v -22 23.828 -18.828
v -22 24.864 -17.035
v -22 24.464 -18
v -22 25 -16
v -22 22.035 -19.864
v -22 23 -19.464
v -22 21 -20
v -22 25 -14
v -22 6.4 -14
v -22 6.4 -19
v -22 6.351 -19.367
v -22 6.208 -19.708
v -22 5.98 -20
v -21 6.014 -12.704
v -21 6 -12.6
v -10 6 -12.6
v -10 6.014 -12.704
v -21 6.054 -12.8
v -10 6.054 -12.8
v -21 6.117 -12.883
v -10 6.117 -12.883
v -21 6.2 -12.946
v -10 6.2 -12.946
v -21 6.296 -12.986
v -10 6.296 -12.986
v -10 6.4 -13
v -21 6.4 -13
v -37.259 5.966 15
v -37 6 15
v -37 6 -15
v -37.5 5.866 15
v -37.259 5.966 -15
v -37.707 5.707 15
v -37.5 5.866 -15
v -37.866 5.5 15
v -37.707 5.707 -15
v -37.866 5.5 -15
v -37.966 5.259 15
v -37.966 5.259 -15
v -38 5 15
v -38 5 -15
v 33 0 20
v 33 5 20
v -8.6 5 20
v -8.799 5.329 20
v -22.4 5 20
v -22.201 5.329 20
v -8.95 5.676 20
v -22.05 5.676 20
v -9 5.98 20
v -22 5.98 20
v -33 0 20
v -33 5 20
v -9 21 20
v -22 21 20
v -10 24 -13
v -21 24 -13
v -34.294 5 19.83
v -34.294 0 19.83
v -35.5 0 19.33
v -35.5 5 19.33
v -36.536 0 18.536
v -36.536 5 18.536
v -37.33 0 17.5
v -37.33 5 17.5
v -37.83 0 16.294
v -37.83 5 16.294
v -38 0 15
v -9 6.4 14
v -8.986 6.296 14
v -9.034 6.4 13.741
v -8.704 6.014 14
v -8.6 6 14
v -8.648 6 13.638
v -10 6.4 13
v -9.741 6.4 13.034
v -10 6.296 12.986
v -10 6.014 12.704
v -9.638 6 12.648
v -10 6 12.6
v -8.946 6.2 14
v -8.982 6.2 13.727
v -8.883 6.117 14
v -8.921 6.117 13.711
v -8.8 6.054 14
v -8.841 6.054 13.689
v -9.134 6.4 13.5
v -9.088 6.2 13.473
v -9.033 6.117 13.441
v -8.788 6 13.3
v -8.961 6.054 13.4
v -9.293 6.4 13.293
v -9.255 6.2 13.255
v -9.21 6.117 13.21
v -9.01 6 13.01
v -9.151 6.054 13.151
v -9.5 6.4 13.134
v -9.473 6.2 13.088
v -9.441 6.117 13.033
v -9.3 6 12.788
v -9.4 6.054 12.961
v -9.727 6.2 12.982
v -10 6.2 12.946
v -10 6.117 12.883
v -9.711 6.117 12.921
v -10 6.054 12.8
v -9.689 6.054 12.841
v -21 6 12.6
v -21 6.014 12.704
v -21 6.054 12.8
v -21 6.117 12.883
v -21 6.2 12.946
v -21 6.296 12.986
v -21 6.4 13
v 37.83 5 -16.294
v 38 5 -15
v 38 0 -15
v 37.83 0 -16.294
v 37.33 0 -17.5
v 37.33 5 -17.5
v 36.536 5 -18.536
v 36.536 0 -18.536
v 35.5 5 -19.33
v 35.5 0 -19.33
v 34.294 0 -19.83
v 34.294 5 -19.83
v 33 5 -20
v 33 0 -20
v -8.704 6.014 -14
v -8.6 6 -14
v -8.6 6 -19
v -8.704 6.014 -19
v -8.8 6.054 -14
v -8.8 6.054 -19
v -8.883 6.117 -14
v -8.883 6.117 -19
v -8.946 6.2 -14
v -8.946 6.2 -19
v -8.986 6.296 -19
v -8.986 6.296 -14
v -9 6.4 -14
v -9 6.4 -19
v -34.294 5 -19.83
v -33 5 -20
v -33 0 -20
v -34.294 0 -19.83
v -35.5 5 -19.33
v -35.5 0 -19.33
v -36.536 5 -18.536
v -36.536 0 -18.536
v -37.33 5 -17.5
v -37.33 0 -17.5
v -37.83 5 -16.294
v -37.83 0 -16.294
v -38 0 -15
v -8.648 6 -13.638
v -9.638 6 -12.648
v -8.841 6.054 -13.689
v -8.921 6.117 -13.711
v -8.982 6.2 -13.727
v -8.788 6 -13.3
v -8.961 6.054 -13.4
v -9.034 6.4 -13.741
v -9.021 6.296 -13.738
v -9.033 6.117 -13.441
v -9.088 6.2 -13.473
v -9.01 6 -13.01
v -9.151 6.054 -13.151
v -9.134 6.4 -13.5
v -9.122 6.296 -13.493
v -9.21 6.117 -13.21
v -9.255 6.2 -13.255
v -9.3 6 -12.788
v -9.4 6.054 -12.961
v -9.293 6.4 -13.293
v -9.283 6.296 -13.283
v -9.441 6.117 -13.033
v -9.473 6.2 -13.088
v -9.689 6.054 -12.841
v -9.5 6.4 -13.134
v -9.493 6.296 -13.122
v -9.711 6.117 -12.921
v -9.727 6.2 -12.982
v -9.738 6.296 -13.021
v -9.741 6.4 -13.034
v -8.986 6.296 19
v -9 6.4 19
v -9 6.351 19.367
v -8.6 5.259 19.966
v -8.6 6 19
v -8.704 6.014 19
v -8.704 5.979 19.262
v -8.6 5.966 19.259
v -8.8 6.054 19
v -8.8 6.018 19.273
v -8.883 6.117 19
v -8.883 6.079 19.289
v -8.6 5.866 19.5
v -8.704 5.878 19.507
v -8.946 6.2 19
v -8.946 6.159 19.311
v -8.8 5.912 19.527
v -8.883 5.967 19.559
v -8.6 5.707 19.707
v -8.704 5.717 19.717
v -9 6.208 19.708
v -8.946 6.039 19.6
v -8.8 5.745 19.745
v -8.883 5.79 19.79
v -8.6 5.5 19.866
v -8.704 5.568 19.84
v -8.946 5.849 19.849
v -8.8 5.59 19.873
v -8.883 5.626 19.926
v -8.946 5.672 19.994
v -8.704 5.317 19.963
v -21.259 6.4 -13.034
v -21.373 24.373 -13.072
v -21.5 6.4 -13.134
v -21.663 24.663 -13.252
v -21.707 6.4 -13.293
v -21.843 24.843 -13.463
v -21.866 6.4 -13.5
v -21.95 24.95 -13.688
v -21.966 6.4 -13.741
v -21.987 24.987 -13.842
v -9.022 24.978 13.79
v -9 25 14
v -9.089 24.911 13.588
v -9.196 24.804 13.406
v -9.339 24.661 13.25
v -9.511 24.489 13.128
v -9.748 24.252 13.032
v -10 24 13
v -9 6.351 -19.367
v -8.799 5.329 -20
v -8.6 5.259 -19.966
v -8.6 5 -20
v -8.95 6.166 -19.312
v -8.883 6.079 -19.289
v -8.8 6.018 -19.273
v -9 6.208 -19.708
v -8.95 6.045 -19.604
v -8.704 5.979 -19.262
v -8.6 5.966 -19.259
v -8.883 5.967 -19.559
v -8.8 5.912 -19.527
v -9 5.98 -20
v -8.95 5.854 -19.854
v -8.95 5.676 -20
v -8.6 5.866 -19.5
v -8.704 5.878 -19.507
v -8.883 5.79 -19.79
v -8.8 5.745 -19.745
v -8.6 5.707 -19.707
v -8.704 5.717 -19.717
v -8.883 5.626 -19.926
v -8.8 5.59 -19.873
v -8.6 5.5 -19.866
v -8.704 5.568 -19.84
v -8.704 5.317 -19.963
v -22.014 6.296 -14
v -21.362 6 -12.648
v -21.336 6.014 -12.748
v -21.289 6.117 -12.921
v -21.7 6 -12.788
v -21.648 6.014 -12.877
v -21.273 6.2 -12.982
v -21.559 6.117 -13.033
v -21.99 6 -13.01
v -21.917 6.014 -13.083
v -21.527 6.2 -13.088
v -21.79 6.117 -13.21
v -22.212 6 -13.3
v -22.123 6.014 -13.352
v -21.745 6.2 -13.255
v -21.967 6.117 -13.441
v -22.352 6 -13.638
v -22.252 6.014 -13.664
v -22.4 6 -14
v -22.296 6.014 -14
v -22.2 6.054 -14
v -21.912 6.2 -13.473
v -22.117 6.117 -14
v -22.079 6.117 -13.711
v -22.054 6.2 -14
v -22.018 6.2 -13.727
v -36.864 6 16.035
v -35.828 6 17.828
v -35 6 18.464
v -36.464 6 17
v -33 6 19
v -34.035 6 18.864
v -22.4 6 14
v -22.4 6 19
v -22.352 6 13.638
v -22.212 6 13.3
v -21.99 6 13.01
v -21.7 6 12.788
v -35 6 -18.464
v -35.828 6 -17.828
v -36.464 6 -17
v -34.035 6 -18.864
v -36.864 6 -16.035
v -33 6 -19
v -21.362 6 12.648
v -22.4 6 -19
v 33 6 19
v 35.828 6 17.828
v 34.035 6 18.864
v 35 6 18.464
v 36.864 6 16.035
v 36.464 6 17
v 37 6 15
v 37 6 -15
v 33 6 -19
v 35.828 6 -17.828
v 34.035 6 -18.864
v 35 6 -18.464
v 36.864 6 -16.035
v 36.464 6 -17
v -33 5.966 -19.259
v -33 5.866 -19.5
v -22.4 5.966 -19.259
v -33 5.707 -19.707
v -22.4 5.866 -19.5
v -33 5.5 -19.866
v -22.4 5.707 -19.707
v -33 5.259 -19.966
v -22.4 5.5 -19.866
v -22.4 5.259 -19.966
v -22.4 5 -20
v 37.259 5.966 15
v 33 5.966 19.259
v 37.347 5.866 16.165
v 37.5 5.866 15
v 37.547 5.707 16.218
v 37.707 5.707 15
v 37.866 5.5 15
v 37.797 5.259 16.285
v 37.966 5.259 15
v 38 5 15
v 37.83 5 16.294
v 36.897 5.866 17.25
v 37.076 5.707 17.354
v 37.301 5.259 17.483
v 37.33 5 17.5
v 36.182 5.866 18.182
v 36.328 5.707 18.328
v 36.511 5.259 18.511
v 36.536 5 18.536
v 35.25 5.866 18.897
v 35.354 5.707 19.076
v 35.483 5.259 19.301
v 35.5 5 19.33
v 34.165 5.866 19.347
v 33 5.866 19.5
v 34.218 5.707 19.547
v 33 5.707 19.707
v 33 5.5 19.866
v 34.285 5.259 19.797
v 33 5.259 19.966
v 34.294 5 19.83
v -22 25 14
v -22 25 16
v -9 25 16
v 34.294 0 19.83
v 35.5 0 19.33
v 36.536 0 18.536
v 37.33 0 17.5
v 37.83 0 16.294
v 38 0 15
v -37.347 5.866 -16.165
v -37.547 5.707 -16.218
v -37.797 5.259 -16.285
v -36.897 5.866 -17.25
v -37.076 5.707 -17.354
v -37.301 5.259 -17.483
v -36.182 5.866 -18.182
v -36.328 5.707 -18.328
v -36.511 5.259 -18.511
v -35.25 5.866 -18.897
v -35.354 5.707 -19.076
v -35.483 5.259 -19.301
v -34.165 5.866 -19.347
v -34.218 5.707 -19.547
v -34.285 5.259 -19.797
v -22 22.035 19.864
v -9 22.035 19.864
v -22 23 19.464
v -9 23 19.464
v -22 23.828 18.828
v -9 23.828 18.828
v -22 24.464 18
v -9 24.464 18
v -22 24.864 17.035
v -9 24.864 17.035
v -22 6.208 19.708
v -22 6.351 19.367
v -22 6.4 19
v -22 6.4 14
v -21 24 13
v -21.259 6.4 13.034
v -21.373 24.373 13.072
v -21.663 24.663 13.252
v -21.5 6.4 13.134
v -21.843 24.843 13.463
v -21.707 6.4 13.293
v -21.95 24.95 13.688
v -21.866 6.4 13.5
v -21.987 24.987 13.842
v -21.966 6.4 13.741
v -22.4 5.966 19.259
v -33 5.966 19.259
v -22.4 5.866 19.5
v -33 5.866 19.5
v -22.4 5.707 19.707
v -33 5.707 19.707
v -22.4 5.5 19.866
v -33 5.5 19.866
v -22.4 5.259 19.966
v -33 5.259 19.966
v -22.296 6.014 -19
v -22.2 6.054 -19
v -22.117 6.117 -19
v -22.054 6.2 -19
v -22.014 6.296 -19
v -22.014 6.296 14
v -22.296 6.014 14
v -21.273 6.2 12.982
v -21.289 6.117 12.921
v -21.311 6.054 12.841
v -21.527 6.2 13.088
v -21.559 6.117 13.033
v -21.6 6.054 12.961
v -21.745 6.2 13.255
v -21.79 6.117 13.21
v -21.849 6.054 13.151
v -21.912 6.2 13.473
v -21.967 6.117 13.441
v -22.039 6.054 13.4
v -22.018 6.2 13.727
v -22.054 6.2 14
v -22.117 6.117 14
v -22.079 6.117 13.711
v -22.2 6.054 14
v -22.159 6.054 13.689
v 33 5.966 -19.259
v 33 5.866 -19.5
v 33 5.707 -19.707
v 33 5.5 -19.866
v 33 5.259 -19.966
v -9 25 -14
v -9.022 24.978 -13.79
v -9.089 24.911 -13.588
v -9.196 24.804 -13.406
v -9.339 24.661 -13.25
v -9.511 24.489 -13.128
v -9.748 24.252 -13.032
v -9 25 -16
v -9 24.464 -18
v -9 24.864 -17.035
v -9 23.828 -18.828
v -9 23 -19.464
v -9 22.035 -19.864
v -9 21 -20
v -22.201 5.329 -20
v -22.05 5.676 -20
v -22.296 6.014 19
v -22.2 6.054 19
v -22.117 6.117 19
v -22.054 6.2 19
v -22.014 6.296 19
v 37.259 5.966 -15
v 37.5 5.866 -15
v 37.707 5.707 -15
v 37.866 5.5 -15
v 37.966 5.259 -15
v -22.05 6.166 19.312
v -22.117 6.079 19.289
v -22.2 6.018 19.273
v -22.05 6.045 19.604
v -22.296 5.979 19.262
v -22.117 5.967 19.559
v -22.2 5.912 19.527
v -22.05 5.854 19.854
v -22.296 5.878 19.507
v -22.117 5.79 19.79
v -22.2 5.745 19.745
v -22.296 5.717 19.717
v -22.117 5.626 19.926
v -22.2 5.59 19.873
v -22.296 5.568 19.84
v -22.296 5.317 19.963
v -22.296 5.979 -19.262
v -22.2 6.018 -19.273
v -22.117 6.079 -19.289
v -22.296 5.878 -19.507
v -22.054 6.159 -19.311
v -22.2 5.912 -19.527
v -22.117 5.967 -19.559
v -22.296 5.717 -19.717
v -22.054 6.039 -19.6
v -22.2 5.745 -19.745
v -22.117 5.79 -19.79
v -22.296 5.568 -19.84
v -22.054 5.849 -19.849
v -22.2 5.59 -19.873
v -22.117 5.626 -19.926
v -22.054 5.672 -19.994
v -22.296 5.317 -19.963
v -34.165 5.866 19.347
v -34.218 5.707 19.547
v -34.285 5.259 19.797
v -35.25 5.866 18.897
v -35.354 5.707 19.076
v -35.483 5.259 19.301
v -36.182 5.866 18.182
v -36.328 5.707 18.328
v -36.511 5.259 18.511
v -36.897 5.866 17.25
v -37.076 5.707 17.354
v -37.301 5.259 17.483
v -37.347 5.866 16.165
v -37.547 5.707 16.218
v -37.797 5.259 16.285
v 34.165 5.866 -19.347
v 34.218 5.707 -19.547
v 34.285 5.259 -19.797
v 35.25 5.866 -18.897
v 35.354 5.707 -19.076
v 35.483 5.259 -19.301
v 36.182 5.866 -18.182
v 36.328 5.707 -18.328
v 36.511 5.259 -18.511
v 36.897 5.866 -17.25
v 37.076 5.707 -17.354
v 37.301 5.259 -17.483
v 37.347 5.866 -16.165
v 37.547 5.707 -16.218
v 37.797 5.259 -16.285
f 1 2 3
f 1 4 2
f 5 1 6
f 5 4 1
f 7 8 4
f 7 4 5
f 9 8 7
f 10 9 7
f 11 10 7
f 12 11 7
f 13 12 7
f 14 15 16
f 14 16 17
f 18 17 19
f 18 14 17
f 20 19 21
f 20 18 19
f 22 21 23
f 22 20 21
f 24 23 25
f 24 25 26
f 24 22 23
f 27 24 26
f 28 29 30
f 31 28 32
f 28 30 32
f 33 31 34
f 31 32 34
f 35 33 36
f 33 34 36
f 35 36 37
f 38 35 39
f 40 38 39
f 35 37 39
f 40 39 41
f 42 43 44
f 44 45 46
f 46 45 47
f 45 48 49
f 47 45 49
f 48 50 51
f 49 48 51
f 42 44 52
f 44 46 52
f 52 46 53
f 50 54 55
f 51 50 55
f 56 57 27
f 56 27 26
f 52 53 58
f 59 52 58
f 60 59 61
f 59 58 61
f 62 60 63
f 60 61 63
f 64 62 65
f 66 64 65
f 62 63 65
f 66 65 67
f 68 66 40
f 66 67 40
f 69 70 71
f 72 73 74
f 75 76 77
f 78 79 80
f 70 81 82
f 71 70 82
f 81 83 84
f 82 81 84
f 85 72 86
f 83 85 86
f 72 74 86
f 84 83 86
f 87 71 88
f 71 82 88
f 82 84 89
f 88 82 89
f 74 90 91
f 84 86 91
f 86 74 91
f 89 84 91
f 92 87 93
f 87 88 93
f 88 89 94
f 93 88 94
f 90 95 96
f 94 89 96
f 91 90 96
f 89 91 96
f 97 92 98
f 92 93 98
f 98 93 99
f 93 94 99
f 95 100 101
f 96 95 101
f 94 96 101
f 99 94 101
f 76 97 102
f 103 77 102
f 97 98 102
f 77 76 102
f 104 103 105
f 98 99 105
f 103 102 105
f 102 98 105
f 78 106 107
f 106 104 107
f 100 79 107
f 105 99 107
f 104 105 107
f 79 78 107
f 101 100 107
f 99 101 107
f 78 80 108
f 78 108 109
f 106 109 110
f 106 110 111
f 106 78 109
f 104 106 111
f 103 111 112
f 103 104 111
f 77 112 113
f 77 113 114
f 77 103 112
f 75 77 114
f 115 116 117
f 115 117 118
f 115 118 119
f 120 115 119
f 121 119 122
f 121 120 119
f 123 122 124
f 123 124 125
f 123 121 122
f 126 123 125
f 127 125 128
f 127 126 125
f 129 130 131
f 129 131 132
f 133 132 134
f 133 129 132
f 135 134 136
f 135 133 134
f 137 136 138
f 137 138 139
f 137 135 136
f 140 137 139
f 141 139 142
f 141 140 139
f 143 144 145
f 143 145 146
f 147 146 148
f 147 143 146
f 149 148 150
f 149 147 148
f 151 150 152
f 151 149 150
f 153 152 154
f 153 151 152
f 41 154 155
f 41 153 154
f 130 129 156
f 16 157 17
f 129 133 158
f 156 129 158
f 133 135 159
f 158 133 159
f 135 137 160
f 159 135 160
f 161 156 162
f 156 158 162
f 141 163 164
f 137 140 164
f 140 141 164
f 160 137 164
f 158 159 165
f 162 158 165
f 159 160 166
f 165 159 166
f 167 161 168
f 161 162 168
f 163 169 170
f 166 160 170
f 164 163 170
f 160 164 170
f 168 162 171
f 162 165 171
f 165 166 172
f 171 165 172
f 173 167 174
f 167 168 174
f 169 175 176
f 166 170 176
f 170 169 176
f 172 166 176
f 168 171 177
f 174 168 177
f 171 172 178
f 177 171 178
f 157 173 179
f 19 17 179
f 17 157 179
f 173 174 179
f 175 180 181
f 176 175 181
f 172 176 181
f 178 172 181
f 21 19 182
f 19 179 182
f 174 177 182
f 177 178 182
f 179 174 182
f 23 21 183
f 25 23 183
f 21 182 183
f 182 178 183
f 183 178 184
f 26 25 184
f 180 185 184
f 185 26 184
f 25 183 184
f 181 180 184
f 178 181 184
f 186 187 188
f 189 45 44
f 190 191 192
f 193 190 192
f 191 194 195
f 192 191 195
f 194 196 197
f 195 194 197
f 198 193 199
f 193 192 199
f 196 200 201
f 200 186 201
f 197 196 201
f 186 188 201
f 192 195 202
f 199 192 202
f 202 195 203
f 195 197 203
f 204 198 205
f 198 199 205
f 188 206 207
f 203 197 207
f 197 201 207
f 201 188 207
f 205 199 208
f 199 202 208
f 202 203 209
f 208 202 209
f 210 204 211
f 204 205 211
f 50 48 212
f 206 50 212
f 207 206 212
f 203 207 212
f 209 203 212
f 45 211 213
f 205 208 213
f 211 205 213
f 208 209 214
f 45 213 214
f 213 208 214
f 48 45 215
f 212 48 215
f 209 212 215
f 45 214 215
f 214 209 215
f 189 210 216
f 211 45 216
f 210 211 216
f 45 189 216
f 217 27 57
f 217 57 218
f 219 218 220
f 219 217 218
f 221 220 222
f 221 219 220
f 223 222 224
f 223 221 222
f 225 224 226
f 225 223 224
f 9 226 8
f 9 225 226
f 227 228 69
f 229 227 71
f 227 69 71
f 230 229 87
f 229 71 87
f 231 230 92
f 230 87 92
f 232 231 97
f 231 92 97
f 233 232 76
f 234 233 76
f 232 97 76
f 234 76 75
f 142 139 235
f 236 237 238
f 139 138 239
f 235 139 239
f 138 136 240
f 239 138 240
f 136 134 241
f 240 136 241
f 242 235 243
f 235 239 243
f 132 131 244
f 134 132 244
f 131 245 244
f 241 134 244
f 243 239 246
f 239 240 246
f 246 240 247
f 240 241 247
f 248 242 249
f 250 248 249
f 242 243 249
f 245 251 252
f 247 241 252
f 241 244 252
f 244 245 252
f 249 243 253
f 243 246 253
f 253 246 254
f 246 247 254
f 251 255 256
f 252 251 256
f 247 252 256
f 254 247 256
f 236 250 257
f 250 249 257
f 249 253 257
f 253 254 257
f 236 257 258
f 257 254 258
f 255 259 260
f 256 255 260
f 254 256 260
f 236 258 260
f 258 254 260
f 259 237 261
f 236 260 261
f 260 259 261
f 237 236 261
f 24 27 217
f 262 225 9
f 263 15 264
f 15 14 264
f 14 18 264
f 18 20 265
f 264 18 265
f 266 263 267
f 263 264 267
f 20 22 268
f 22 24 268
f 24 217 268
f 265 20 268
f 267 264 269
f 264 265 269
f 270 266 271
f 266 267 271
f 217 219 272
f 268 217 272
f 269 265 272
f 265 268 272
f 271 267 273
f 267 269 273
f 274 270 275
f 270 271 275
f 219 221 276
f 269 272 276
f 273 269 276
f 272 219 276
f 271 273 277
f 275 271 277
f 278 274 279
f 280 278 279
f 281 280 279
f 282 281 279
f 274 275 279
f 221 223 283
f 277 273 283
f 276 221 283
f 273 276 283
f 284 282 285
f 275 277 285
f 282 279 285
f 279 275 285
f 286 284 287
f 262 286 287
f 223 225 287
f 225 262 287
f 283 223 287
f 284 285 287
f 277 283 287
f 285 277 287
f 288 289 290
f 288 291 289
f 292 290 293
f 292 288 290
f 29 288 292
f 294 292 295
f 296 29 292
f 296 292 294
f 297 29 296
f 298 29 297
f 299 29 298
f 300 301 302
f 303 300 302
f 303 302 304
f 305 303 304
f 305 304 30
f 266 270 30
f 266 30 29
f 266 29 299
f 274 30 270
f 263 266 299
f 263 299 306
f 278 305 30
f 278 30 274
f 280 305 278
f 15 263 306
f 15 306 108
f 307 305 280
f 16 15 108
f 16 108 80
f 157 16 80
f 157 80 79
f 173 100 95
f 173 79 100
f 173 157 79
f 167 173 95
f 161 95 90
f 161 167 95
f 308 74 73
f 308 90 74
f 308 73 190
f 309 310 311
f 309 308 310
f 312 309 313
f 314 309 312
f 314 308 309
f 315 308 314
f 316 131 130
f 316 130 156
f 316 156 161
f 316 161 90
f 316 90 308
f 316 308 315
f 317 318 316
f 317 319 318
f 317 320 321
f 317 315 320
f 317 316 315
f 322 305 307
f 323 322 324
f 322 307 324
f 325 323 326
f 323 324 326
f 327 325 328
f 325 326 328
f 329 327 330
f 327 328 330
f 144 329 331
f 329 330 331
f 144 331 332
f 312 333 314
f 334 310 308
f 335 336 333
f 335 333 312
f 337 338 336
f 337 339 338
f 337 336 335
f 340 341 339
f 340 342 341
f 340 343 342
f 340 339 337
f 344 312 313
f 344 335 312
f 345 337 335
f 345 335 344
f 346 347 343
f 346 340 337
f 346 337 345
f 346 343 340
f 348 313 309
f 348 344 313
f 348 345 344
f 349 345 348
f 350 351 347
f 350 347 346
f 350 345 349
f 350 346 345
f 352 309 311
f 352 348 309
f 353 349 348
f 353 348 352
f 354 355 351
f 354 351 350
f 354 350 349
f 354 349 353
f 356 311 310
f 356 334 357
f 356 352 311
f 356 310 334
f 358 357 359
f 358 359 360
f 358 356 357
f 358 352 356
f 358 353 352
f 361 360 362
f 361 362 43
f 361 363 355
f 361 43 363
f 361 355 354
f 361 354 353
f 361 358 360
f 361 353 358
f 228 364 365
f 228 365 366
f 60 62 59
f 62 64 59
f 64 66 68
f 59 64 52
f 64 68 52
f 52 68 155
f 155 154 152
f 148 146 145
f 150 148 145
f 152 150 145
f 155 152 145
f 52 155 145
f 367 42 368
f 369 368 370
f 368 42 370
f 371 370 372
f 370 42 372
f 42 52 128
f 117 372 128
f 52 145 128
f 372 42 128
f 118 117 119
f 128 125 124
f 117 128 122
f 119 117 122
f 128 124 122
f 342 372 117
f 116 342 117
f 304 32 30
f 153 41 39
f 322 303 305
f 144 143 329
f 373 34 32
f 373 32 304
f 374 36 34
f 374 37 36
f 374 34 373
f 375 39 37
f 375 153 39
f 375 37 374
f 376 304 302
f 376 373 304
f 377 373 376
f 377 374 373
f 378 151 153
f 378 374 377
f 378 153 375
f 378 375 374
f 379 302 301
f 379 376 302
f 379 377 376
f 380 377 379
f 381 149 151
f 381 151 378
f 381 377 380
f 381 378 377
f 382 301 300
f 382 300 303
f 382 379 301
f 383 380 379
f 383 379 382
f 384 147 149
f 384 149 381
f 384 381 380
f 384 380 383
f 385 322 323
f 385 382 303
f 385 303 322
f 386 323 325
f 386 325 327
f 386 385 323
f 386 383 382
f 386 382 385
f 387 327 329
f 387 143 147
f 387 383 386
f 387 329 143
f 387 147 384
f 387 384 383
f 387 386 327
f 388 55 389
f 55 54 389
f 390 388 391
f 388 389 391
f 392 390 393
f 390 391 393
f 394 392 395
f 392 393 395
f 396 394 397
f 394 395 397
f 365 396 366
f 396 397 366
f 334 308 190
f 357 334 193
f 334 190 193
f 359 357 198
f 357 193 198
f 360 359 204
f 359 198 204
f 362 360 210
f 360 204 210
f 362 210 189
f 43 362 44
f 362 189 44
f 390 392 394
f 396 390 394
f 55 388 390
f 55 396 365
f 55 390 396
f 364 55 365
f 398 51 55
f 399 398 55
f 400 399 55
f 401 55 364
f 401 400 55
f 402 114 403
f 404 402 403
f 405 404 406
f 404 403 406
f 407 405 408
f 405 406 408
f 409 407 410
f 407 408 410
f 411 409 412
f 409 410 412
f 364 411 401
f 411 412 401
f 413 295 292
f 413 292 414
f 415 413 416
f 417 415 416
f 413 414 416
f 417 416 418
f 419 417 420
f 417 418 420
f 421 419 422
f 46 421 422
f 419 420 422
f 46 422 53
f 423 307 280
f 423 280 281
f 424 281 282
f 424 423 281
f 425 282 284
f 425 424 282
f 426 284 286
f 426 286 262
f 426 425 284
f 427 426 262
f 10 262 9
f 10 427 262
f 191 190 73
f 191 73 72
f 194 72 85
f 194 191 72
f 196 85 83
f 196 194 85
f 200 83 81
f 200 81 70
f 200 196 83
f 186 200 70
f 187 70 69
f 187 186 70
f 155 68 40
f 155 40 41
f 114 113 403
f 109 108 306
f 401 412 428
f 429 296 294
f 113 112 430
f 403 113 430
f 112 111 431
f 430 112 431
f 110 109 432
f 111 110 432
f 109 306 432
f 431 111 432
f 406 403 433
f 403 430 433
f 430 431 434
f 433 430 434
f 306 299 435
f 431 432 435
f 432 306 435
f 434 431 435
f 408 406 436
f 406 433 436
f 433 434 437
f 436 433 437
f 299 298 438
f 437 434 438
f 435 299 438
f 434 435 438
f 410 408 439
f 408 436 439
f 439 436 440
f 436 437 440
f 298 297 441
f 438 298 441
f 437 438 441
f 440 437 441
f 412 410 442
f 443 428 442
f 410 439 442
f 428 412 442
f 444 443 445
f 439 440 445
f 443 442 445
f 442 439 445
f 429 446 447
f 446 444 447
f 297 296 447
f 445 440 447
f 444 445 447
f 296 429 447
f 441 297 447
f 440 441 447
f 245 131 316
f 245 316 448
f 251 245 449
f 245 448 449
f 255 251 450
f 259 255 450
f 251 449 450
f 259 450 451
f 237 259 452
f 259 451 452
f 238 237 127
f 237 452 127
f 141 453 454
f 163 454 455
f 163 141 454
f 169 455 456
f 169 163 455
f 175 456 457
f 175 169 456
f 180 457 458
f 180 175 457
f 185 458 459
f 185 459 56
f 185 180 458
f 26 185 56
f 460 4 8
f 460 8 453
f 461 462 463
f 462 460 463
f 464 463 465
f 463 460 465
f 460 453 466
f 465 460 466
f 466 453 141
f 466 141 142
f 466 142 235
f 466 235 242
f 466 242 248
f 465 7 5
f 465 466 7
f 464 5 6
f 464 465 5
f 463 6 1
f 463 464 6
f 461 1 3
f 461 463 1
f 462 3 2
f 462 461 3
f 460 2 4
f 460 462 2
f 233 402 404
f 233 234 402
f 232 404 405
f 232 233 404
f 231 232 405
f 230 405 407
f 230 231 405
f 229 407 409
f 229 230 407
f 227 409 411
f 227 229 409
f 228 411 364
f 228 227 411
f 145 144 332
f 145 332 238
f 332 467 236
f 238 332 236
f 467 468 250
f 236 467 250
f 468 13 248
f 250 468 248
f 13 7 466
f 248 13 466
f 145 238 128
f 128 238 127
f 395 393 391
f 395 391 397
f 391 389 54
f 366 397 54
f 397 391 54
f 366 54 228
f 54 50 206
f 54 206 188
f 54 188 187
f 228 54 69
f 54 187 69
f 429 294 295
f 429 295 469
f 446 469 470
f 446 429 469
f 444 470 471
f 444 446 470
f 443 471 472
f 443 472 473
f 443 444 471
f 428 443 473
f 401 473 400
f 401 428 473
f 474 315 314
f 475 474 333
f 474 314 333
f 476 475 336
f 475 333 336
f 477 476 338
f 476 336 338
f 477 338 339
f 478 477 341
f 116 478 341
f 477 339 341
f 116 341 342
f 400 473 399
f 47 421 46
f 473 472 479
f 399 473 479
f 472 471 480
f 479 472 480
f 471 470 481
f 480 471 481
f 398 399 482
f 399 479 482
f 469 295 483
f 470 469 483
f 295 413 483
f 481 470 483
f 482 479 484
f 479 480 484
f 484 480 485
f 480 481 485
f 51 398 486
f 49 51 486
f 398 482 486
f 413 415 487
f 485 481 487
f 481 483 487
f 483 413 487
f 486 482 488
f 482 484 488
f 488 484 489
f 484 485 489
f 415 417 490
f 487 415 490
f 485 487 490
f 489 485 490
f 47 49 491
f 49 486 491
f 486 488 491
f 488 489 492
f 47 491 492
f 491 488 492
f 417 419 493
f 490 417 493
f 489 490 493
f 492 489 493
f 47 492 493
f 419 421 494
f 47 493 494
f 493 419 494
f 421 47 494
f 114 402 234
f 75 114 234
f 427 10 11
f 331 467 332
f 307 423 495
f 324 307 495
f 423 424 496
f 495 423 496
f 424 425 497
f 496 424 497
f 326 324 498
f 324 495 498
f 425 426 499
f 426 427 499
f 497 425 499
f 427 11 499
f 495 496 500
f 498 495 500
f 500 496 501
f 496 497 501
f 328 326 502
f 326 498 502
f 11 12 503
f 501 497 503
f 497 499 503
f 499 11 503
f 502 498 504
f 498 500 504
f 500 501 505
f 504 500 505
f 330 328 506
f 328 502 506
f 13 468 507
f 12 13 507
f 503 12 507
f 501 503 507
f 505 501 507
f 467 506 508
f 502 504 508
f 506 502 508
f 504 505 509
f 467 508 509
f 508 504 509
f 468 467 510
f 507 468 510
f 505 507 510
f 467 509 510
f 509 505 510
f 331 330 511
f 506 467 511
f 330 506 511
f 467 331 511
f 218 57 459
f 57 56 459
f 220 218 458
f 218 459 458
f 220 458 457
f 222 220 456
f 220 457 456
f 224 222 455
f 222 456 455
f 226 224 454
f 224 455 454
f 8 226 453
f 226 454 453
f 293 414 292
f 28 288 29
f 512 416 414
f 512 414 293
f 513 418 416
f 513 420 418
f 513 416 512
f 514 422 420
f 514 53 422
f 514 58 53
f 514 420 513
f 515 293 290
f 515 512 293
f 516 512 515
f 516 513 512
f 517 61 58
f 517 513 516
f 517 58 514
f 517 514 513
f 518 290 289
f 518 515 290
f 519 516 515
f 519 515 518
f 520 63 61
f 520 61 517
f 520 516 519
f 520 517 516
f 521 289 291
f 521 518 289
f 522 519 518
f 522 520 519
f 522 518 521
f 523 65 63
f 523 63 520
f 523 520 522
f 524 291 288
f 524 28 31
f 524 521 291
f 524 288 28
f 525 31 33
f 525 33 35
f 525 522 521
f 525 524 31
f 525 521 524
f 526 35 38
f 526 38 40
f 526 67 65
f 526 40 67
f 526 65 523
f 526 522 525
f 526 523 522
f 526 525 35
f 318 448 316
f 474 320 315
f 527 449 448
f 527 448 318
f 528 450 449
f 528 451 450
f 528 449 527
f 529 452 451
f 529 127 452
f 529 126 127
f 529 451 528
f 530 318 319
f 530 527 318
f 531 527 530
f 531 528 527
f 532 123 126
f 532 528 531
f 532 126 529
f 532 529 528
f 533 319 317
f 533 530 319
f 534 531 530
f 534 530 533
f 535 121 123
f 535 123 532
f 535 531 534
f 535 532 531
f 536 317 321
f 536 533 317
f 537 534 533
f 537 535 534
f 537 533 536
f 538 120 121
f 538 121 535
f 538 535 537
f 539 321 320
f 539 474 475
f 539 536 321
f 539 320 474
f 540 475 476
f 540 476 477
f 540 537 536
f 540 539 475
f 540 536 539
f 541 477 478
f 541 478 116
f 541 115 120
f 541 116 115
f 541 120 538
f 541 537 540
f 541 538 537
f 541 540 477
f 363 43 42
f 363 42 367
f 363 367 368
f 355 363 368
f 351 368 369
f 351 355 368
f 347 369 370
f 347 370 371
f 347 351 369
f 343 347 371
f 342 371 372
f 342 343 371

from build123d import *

# Parameters (mm, degrees)
SKETCH_1_W          = 76
SKETCH_1_H          = 40
EXTRUDE_1_DEPTH     = 6
SKETCH_2_W          = 13
SKETCH_2_H          = 40
EXTRUDE_2_DEPTH     = 19
SKETCH_3_W          = 13
SKETCH_3_H          = 26
CUT_EXTRUDE_1_DEPTH = 19
FILLET_1_R          = 4
FILLET_2_R          = 1
FILLET_3_R          = 1
FILLET_4_R          = 5
FILLET_5_R          = 1
FILLET_6_R          = 1
FILLET_7_R          = 0.4


with BuildPart() as part:
    # Эскиз1 → Бобышка-Вытянуть1 (new body)
    with BuildSketch(Plane(origin=(0, 0, 0), x_dir=(1, 0, 0), z_dir=(0, 1, 0))):
        Rectangle(SKETCH_1_W, SKETCH_1_H)
    extrude(amount=EXTRUDE_1_DEPTH)

    # Эскиз2 → Бобышка-Вытянуть2 (add)
    with BuildSketch(Plane(origin=(0, 6, 0), x_dir=(1, 0, 0), z_dir=(0, 1, 0))):
        with Locations((-15.5, 0)):
            Rectangle(SKETCH_2_W, SKETCH_2_H)
    extrude(amount=EXTRUDE_2_DEPTH)

    # Эскиз3 → Вырез-Вытянуть1 (cut)
    with BuildSketch(Plane(origin=(0, 25, 0), x_dir=(1, 0, 0), z_dir=(0, 1, 0))):
        with Locations((-15.5, 0)):
            Rectangle(SKETCH_3_W, SKETCH_3_H)
    extrude(amount=-CUT_EXTRUDE_1_DEPTH, mode=Mode.SUBTRACT)

    # Скругление1
    fillet_1_edges = [part.edges().sort_by_distance(p)[0] for p in [
        (-15.5, 25, 20),
        (-15.5, 25, -20),
    ]]
    fillet(fillet_1_edges, radius=FILLET_1_R)

    # Скругление2
    fillet_2_edges = [part.edges().sort_by_distance(p)[0] for p in [
        (-22, 15.5, -13),
        (-9, 15.5, -13),
        (-15.5, 25, -13),
    ]]
    fillet(fillet_2_edges, radius=FILLET_2_R)

    # Скругление3
    fillet_3_edges = [part.edges().sort_by_distance(p)[0] for p in [
        (-22, 15.5, 13),
        (-9, 15.5, 13),
        (-15.5, 25, 13),
    ]]
    fillet(fillet_3_edges, radius=FILLET_3_R)

    # Скругление4
    fillet_4_edges = [part.edges().sort_by_distance(p)[0] for p in [
        (38, 3, 20),
        (-38, 3, 20),
        (-38, 3, -20),
        (38, 3, -20),
    ]]
    fillet(fillet_4_edges, radius=FILLET_4_R)

    # Скругление5
    fillet_5_edges = [part.edges().sort_by_distance(p)[0] for p in [
        (-38, 6, 0),
        (-27.5, 6, 20),
        (-36.535533906, 6, 18.535533906),
        (-36.535533906, 6, -18.535533906),
        (-27.5, 6, -20),
    ]]
    fillet(fillet_5_edges, radius=FILLET_5_R)

    # Скругление6
    fillet_6_edges = [part.edges().sort_by_distance(p)[0] for p in [
        (12, 6, -20),
        (38, 6, 0),
        (36.535533906, 6, -18.535533906),
        (36.535533906, 6, 18.535533906),
        (12, 6, 20),
    ]]
    fillet(fillet_6_edges, radius=FILLET_6_R)

    # Скругление7
    # the kernel refuses this fillet: 0.4 mm, written as the material it adds along each edge
    with BuildSketch(Plane(origin=(-22, 6, -19), x_dir=(-1, 0, 0), z_dir=(0, 0, 1)), Plane(origin=(-9, 6, 19), x_dir=(1, 0, 0), z_dir=(0, 0, -1)), Plane(origin=(-9, 6, -14), x_dir=(1, 0, 0), z_dir=(0, 0, -1)), Plane(origin=(-22, 6, 14), x_dir=(-1, 0, 0), z_dir=(0, 0, 1))) as fillet_7_piece_1:
        with BuildLine():
            CenterArc((FILLET_7_R, -FILLET_7_R), FILLET_7_R, 90, 90)
            Line((0, -FILLET_7_R), (0, 0))
            Line((0, 0), (FILLET_7_R, 0))
        make_face()
    extrude(amount=5)
    with BuildSketch(Plane(origin=(-22, 5, -19), x_dir=(0, 1, 0), z_dir=(0, 0, 1))) as fillet_7_piece_2_section:
        with BuildLine():
            CenterArc((1 + FILLET_7_R, FILLET_7_R), FILLET_7_R, 180, 90)
            Line((1, FILLET_7_R), (1, 0))
            Line((1, 0), (1 + FILLET_7_R, 0))
        make_face()
    fillet_7_piece_2 = revolve(axis=Axis((-22, 5, -19), (-1, 0, 0)), revolution_arc=147.318795695, mode=Mode.PRIVATE)
    fillet_7_piece_2 = split(fillet_7_piece_2, bisect_by=Plane(origin=(-22.06536945, 6.084454663, -20), z_dir=(0, 0, 1)), keep=Keep.TOP, mode=Mode.PRIVATE)
    add(fillet_7_piece_2)
    with BuildSketch(Plane(origin=(-22, 5, 19), x_dir=(0, 1, 0), z_dir=(0, 0, -1))) as fillet_7_piece_3_section:
        with BuildLine():
            CenterArc((1 + FILLET_7_R, -FILLET_7_R), FILLET_7_R, 90, 90)
            Line((1 + FILLET_7_R, 0), (1, 0))
            Line((1, 0), (1, -FILLET_7_R))
        make_face()
    fillet_7_piece_3 = revolve(axis=Axis((-22, 5, 19), (1, 0, 0)), revolution_arc=147.318795695, mode=Mode.PRIVATE)
    fillet_7_piece_3 = split(fillet_7_piece_3, bisect_by=Plane(origin=(-22.10538555, 5.722614098, 20), z_dir=(0, 0, -1)), keep=Keep.TOP, mode=Mode.PRIVATE)
    add(fillet_7_piece_3)
    with BuildSketch(Plane(origin=(-9, 5, -19), x_dir=(0, 1, 0), z_dir=(0, 0, 1))) as fillet_7_piece_4_section:
        with BuildLine():
            CenterArc((1 + FILLET_7_R, -FILLET_7_R), FILLET_7_R, 90, 90)
            Line((1, -FILLET_7_R), (1, 0))
            Line((1, 0), (1 + FILLET_7_R, 0))
        make_face()
    fillet_7_piece_4 = revolve(axis=Axis((-9, 5, -19), (-1, 0, 0)), revolution_arc=147.318795695, mode=Mode.PRIVATE)
    fillet_7_piece_4 = split(fillet_7_piece_4, bisect_by=Plane(origin=(-8.934630555, 6.084454665, -20), z_dir=(0, 0, 1)), keep=Keep.TOP, mode=Mode.PRIVATE)
    add(fillet_7_piece_4)
    with BuildSketch(Plane(origin=(-9, 5, 19), x_dir=(0, 1, 0), z_dir=(0, 0, -1))) as fillet_7_piece_5_section:
        with BuildLine():
            CenterArc((1 + FILLET_7_R, FILLET_7_R), FILLET_7_R, 180, 90)
            Line((1 + FILLET_7_R, 0), (1, 0))
            Line((1, 0), (1, FILLET_7_R))
        make_face()
    fillet_7_piece_5 = revolve(axis=Axis((-9, 5, 19), (1, 0, 0)), revolution_arc=147.318795695, mode=Mode.PRIVATE)
    fillet_7_piece_5 = split(fillet_7_piece_5, bisect_by=Plane(origin=(-8.894614474, 5.72261425, 20), z_dir=(0, 0, -1)), keep=Keep.TOP, mode=Mode.PRIVATE)
    add(fillet_7_piece_5)
    with BuildSketch(Plane(origin=(-21, 6, -13), x_dir=(0, 0, 1), z_dir=(1, 0, 0)), Plane(origin=(-10, 6, 13), x_dir=(0, 0, -1), z_dir=(-1, 0, 0))) as fillet_7_piece_6:
        with BuildLine():
            CenterArc((FILLET_7_R, -FILLET_7_R), FILLET_7_R, 90, 90)
            Line((0, -FILLET_7_R), (0, 0))
            Line((0, 0), (FILLET_7_R, 0))
        make_face()
    extrude(amount=11)
    with BuildSketch(Plane(origin=(-10, 6, -14), x_dir=(1, 0, 0), z_dir=(0, 0, -1))) as fillet_7_piece_7:
        with BuildLine():
            CenterArc((1 + FILLET_7_R, -FILLET_7_R), FILLET_7_R, 90, 90)
            Line((1, -FILLET_7_R), (1, 0))
            Line((1, 0), (1 + FILLET_7_R, 0))
        make_face()
    revolve(axis=Axis((-10, 6, -14), (0, -1, 0)), revolution_arc=90)
    with BuildSketch(Plane(origin=(-21, 6, -14), x_dir=(0, 0, 1), z_dir=(1, 0, 0))) as fillet_7_piece_8:
        with BuildLine():
            CenterArc((1 + FILLET_7_R, -FILLET_7_R), FILLET_7_R, 90, 90)
            Line((1, -FILLET_7_R), (1, 0))
            Line((1, 0), (1 + FILLET_7_R, 0))
        make_face()
    revolve(axis=Axis((-21, 6, -14), (0, -1, 0)), revolution_arc=90)
    with BuildSketch(Plane(origin=(-10, 6, 14), x_dir=(1, 0, 0), z_dir=(0, 0, 1))) as fillet_7_piece_9:
        with BuildLine():
            CenterArc((1 + FILLET_7_R, FILLET_7_R), FILLET_7_R, 180, 90)
            Line((1, FILLET_7_R), (1, 0))
            Line((1, 0), (1 + FILLET_7_R, 0))
        make_face()
    revolve(axis=Axis((-10, 6, 14), (0, 1, 0)), revolution_arc=90)
    with BuildSketch(Plane(origin=(-21, 6, 14), x_dir=(0, 0, -1), z_dir=(1, 0, 0))) as fillet_7_piece_10:
        with BuildLine():
            CenterArc((1 + FILLET_7_R, FILLET_7_R), FILLET_7_R, 180, 90)
            Line((1, FILLET_7_R), (1, 0))
            Line((1, 0), (1 + FILLET_7_R, 0))
        make_face()
    revolve(axis=Axis((-21, 6, 14), (0, 1, 0)), revolution_arc=90)


solid = part.part
